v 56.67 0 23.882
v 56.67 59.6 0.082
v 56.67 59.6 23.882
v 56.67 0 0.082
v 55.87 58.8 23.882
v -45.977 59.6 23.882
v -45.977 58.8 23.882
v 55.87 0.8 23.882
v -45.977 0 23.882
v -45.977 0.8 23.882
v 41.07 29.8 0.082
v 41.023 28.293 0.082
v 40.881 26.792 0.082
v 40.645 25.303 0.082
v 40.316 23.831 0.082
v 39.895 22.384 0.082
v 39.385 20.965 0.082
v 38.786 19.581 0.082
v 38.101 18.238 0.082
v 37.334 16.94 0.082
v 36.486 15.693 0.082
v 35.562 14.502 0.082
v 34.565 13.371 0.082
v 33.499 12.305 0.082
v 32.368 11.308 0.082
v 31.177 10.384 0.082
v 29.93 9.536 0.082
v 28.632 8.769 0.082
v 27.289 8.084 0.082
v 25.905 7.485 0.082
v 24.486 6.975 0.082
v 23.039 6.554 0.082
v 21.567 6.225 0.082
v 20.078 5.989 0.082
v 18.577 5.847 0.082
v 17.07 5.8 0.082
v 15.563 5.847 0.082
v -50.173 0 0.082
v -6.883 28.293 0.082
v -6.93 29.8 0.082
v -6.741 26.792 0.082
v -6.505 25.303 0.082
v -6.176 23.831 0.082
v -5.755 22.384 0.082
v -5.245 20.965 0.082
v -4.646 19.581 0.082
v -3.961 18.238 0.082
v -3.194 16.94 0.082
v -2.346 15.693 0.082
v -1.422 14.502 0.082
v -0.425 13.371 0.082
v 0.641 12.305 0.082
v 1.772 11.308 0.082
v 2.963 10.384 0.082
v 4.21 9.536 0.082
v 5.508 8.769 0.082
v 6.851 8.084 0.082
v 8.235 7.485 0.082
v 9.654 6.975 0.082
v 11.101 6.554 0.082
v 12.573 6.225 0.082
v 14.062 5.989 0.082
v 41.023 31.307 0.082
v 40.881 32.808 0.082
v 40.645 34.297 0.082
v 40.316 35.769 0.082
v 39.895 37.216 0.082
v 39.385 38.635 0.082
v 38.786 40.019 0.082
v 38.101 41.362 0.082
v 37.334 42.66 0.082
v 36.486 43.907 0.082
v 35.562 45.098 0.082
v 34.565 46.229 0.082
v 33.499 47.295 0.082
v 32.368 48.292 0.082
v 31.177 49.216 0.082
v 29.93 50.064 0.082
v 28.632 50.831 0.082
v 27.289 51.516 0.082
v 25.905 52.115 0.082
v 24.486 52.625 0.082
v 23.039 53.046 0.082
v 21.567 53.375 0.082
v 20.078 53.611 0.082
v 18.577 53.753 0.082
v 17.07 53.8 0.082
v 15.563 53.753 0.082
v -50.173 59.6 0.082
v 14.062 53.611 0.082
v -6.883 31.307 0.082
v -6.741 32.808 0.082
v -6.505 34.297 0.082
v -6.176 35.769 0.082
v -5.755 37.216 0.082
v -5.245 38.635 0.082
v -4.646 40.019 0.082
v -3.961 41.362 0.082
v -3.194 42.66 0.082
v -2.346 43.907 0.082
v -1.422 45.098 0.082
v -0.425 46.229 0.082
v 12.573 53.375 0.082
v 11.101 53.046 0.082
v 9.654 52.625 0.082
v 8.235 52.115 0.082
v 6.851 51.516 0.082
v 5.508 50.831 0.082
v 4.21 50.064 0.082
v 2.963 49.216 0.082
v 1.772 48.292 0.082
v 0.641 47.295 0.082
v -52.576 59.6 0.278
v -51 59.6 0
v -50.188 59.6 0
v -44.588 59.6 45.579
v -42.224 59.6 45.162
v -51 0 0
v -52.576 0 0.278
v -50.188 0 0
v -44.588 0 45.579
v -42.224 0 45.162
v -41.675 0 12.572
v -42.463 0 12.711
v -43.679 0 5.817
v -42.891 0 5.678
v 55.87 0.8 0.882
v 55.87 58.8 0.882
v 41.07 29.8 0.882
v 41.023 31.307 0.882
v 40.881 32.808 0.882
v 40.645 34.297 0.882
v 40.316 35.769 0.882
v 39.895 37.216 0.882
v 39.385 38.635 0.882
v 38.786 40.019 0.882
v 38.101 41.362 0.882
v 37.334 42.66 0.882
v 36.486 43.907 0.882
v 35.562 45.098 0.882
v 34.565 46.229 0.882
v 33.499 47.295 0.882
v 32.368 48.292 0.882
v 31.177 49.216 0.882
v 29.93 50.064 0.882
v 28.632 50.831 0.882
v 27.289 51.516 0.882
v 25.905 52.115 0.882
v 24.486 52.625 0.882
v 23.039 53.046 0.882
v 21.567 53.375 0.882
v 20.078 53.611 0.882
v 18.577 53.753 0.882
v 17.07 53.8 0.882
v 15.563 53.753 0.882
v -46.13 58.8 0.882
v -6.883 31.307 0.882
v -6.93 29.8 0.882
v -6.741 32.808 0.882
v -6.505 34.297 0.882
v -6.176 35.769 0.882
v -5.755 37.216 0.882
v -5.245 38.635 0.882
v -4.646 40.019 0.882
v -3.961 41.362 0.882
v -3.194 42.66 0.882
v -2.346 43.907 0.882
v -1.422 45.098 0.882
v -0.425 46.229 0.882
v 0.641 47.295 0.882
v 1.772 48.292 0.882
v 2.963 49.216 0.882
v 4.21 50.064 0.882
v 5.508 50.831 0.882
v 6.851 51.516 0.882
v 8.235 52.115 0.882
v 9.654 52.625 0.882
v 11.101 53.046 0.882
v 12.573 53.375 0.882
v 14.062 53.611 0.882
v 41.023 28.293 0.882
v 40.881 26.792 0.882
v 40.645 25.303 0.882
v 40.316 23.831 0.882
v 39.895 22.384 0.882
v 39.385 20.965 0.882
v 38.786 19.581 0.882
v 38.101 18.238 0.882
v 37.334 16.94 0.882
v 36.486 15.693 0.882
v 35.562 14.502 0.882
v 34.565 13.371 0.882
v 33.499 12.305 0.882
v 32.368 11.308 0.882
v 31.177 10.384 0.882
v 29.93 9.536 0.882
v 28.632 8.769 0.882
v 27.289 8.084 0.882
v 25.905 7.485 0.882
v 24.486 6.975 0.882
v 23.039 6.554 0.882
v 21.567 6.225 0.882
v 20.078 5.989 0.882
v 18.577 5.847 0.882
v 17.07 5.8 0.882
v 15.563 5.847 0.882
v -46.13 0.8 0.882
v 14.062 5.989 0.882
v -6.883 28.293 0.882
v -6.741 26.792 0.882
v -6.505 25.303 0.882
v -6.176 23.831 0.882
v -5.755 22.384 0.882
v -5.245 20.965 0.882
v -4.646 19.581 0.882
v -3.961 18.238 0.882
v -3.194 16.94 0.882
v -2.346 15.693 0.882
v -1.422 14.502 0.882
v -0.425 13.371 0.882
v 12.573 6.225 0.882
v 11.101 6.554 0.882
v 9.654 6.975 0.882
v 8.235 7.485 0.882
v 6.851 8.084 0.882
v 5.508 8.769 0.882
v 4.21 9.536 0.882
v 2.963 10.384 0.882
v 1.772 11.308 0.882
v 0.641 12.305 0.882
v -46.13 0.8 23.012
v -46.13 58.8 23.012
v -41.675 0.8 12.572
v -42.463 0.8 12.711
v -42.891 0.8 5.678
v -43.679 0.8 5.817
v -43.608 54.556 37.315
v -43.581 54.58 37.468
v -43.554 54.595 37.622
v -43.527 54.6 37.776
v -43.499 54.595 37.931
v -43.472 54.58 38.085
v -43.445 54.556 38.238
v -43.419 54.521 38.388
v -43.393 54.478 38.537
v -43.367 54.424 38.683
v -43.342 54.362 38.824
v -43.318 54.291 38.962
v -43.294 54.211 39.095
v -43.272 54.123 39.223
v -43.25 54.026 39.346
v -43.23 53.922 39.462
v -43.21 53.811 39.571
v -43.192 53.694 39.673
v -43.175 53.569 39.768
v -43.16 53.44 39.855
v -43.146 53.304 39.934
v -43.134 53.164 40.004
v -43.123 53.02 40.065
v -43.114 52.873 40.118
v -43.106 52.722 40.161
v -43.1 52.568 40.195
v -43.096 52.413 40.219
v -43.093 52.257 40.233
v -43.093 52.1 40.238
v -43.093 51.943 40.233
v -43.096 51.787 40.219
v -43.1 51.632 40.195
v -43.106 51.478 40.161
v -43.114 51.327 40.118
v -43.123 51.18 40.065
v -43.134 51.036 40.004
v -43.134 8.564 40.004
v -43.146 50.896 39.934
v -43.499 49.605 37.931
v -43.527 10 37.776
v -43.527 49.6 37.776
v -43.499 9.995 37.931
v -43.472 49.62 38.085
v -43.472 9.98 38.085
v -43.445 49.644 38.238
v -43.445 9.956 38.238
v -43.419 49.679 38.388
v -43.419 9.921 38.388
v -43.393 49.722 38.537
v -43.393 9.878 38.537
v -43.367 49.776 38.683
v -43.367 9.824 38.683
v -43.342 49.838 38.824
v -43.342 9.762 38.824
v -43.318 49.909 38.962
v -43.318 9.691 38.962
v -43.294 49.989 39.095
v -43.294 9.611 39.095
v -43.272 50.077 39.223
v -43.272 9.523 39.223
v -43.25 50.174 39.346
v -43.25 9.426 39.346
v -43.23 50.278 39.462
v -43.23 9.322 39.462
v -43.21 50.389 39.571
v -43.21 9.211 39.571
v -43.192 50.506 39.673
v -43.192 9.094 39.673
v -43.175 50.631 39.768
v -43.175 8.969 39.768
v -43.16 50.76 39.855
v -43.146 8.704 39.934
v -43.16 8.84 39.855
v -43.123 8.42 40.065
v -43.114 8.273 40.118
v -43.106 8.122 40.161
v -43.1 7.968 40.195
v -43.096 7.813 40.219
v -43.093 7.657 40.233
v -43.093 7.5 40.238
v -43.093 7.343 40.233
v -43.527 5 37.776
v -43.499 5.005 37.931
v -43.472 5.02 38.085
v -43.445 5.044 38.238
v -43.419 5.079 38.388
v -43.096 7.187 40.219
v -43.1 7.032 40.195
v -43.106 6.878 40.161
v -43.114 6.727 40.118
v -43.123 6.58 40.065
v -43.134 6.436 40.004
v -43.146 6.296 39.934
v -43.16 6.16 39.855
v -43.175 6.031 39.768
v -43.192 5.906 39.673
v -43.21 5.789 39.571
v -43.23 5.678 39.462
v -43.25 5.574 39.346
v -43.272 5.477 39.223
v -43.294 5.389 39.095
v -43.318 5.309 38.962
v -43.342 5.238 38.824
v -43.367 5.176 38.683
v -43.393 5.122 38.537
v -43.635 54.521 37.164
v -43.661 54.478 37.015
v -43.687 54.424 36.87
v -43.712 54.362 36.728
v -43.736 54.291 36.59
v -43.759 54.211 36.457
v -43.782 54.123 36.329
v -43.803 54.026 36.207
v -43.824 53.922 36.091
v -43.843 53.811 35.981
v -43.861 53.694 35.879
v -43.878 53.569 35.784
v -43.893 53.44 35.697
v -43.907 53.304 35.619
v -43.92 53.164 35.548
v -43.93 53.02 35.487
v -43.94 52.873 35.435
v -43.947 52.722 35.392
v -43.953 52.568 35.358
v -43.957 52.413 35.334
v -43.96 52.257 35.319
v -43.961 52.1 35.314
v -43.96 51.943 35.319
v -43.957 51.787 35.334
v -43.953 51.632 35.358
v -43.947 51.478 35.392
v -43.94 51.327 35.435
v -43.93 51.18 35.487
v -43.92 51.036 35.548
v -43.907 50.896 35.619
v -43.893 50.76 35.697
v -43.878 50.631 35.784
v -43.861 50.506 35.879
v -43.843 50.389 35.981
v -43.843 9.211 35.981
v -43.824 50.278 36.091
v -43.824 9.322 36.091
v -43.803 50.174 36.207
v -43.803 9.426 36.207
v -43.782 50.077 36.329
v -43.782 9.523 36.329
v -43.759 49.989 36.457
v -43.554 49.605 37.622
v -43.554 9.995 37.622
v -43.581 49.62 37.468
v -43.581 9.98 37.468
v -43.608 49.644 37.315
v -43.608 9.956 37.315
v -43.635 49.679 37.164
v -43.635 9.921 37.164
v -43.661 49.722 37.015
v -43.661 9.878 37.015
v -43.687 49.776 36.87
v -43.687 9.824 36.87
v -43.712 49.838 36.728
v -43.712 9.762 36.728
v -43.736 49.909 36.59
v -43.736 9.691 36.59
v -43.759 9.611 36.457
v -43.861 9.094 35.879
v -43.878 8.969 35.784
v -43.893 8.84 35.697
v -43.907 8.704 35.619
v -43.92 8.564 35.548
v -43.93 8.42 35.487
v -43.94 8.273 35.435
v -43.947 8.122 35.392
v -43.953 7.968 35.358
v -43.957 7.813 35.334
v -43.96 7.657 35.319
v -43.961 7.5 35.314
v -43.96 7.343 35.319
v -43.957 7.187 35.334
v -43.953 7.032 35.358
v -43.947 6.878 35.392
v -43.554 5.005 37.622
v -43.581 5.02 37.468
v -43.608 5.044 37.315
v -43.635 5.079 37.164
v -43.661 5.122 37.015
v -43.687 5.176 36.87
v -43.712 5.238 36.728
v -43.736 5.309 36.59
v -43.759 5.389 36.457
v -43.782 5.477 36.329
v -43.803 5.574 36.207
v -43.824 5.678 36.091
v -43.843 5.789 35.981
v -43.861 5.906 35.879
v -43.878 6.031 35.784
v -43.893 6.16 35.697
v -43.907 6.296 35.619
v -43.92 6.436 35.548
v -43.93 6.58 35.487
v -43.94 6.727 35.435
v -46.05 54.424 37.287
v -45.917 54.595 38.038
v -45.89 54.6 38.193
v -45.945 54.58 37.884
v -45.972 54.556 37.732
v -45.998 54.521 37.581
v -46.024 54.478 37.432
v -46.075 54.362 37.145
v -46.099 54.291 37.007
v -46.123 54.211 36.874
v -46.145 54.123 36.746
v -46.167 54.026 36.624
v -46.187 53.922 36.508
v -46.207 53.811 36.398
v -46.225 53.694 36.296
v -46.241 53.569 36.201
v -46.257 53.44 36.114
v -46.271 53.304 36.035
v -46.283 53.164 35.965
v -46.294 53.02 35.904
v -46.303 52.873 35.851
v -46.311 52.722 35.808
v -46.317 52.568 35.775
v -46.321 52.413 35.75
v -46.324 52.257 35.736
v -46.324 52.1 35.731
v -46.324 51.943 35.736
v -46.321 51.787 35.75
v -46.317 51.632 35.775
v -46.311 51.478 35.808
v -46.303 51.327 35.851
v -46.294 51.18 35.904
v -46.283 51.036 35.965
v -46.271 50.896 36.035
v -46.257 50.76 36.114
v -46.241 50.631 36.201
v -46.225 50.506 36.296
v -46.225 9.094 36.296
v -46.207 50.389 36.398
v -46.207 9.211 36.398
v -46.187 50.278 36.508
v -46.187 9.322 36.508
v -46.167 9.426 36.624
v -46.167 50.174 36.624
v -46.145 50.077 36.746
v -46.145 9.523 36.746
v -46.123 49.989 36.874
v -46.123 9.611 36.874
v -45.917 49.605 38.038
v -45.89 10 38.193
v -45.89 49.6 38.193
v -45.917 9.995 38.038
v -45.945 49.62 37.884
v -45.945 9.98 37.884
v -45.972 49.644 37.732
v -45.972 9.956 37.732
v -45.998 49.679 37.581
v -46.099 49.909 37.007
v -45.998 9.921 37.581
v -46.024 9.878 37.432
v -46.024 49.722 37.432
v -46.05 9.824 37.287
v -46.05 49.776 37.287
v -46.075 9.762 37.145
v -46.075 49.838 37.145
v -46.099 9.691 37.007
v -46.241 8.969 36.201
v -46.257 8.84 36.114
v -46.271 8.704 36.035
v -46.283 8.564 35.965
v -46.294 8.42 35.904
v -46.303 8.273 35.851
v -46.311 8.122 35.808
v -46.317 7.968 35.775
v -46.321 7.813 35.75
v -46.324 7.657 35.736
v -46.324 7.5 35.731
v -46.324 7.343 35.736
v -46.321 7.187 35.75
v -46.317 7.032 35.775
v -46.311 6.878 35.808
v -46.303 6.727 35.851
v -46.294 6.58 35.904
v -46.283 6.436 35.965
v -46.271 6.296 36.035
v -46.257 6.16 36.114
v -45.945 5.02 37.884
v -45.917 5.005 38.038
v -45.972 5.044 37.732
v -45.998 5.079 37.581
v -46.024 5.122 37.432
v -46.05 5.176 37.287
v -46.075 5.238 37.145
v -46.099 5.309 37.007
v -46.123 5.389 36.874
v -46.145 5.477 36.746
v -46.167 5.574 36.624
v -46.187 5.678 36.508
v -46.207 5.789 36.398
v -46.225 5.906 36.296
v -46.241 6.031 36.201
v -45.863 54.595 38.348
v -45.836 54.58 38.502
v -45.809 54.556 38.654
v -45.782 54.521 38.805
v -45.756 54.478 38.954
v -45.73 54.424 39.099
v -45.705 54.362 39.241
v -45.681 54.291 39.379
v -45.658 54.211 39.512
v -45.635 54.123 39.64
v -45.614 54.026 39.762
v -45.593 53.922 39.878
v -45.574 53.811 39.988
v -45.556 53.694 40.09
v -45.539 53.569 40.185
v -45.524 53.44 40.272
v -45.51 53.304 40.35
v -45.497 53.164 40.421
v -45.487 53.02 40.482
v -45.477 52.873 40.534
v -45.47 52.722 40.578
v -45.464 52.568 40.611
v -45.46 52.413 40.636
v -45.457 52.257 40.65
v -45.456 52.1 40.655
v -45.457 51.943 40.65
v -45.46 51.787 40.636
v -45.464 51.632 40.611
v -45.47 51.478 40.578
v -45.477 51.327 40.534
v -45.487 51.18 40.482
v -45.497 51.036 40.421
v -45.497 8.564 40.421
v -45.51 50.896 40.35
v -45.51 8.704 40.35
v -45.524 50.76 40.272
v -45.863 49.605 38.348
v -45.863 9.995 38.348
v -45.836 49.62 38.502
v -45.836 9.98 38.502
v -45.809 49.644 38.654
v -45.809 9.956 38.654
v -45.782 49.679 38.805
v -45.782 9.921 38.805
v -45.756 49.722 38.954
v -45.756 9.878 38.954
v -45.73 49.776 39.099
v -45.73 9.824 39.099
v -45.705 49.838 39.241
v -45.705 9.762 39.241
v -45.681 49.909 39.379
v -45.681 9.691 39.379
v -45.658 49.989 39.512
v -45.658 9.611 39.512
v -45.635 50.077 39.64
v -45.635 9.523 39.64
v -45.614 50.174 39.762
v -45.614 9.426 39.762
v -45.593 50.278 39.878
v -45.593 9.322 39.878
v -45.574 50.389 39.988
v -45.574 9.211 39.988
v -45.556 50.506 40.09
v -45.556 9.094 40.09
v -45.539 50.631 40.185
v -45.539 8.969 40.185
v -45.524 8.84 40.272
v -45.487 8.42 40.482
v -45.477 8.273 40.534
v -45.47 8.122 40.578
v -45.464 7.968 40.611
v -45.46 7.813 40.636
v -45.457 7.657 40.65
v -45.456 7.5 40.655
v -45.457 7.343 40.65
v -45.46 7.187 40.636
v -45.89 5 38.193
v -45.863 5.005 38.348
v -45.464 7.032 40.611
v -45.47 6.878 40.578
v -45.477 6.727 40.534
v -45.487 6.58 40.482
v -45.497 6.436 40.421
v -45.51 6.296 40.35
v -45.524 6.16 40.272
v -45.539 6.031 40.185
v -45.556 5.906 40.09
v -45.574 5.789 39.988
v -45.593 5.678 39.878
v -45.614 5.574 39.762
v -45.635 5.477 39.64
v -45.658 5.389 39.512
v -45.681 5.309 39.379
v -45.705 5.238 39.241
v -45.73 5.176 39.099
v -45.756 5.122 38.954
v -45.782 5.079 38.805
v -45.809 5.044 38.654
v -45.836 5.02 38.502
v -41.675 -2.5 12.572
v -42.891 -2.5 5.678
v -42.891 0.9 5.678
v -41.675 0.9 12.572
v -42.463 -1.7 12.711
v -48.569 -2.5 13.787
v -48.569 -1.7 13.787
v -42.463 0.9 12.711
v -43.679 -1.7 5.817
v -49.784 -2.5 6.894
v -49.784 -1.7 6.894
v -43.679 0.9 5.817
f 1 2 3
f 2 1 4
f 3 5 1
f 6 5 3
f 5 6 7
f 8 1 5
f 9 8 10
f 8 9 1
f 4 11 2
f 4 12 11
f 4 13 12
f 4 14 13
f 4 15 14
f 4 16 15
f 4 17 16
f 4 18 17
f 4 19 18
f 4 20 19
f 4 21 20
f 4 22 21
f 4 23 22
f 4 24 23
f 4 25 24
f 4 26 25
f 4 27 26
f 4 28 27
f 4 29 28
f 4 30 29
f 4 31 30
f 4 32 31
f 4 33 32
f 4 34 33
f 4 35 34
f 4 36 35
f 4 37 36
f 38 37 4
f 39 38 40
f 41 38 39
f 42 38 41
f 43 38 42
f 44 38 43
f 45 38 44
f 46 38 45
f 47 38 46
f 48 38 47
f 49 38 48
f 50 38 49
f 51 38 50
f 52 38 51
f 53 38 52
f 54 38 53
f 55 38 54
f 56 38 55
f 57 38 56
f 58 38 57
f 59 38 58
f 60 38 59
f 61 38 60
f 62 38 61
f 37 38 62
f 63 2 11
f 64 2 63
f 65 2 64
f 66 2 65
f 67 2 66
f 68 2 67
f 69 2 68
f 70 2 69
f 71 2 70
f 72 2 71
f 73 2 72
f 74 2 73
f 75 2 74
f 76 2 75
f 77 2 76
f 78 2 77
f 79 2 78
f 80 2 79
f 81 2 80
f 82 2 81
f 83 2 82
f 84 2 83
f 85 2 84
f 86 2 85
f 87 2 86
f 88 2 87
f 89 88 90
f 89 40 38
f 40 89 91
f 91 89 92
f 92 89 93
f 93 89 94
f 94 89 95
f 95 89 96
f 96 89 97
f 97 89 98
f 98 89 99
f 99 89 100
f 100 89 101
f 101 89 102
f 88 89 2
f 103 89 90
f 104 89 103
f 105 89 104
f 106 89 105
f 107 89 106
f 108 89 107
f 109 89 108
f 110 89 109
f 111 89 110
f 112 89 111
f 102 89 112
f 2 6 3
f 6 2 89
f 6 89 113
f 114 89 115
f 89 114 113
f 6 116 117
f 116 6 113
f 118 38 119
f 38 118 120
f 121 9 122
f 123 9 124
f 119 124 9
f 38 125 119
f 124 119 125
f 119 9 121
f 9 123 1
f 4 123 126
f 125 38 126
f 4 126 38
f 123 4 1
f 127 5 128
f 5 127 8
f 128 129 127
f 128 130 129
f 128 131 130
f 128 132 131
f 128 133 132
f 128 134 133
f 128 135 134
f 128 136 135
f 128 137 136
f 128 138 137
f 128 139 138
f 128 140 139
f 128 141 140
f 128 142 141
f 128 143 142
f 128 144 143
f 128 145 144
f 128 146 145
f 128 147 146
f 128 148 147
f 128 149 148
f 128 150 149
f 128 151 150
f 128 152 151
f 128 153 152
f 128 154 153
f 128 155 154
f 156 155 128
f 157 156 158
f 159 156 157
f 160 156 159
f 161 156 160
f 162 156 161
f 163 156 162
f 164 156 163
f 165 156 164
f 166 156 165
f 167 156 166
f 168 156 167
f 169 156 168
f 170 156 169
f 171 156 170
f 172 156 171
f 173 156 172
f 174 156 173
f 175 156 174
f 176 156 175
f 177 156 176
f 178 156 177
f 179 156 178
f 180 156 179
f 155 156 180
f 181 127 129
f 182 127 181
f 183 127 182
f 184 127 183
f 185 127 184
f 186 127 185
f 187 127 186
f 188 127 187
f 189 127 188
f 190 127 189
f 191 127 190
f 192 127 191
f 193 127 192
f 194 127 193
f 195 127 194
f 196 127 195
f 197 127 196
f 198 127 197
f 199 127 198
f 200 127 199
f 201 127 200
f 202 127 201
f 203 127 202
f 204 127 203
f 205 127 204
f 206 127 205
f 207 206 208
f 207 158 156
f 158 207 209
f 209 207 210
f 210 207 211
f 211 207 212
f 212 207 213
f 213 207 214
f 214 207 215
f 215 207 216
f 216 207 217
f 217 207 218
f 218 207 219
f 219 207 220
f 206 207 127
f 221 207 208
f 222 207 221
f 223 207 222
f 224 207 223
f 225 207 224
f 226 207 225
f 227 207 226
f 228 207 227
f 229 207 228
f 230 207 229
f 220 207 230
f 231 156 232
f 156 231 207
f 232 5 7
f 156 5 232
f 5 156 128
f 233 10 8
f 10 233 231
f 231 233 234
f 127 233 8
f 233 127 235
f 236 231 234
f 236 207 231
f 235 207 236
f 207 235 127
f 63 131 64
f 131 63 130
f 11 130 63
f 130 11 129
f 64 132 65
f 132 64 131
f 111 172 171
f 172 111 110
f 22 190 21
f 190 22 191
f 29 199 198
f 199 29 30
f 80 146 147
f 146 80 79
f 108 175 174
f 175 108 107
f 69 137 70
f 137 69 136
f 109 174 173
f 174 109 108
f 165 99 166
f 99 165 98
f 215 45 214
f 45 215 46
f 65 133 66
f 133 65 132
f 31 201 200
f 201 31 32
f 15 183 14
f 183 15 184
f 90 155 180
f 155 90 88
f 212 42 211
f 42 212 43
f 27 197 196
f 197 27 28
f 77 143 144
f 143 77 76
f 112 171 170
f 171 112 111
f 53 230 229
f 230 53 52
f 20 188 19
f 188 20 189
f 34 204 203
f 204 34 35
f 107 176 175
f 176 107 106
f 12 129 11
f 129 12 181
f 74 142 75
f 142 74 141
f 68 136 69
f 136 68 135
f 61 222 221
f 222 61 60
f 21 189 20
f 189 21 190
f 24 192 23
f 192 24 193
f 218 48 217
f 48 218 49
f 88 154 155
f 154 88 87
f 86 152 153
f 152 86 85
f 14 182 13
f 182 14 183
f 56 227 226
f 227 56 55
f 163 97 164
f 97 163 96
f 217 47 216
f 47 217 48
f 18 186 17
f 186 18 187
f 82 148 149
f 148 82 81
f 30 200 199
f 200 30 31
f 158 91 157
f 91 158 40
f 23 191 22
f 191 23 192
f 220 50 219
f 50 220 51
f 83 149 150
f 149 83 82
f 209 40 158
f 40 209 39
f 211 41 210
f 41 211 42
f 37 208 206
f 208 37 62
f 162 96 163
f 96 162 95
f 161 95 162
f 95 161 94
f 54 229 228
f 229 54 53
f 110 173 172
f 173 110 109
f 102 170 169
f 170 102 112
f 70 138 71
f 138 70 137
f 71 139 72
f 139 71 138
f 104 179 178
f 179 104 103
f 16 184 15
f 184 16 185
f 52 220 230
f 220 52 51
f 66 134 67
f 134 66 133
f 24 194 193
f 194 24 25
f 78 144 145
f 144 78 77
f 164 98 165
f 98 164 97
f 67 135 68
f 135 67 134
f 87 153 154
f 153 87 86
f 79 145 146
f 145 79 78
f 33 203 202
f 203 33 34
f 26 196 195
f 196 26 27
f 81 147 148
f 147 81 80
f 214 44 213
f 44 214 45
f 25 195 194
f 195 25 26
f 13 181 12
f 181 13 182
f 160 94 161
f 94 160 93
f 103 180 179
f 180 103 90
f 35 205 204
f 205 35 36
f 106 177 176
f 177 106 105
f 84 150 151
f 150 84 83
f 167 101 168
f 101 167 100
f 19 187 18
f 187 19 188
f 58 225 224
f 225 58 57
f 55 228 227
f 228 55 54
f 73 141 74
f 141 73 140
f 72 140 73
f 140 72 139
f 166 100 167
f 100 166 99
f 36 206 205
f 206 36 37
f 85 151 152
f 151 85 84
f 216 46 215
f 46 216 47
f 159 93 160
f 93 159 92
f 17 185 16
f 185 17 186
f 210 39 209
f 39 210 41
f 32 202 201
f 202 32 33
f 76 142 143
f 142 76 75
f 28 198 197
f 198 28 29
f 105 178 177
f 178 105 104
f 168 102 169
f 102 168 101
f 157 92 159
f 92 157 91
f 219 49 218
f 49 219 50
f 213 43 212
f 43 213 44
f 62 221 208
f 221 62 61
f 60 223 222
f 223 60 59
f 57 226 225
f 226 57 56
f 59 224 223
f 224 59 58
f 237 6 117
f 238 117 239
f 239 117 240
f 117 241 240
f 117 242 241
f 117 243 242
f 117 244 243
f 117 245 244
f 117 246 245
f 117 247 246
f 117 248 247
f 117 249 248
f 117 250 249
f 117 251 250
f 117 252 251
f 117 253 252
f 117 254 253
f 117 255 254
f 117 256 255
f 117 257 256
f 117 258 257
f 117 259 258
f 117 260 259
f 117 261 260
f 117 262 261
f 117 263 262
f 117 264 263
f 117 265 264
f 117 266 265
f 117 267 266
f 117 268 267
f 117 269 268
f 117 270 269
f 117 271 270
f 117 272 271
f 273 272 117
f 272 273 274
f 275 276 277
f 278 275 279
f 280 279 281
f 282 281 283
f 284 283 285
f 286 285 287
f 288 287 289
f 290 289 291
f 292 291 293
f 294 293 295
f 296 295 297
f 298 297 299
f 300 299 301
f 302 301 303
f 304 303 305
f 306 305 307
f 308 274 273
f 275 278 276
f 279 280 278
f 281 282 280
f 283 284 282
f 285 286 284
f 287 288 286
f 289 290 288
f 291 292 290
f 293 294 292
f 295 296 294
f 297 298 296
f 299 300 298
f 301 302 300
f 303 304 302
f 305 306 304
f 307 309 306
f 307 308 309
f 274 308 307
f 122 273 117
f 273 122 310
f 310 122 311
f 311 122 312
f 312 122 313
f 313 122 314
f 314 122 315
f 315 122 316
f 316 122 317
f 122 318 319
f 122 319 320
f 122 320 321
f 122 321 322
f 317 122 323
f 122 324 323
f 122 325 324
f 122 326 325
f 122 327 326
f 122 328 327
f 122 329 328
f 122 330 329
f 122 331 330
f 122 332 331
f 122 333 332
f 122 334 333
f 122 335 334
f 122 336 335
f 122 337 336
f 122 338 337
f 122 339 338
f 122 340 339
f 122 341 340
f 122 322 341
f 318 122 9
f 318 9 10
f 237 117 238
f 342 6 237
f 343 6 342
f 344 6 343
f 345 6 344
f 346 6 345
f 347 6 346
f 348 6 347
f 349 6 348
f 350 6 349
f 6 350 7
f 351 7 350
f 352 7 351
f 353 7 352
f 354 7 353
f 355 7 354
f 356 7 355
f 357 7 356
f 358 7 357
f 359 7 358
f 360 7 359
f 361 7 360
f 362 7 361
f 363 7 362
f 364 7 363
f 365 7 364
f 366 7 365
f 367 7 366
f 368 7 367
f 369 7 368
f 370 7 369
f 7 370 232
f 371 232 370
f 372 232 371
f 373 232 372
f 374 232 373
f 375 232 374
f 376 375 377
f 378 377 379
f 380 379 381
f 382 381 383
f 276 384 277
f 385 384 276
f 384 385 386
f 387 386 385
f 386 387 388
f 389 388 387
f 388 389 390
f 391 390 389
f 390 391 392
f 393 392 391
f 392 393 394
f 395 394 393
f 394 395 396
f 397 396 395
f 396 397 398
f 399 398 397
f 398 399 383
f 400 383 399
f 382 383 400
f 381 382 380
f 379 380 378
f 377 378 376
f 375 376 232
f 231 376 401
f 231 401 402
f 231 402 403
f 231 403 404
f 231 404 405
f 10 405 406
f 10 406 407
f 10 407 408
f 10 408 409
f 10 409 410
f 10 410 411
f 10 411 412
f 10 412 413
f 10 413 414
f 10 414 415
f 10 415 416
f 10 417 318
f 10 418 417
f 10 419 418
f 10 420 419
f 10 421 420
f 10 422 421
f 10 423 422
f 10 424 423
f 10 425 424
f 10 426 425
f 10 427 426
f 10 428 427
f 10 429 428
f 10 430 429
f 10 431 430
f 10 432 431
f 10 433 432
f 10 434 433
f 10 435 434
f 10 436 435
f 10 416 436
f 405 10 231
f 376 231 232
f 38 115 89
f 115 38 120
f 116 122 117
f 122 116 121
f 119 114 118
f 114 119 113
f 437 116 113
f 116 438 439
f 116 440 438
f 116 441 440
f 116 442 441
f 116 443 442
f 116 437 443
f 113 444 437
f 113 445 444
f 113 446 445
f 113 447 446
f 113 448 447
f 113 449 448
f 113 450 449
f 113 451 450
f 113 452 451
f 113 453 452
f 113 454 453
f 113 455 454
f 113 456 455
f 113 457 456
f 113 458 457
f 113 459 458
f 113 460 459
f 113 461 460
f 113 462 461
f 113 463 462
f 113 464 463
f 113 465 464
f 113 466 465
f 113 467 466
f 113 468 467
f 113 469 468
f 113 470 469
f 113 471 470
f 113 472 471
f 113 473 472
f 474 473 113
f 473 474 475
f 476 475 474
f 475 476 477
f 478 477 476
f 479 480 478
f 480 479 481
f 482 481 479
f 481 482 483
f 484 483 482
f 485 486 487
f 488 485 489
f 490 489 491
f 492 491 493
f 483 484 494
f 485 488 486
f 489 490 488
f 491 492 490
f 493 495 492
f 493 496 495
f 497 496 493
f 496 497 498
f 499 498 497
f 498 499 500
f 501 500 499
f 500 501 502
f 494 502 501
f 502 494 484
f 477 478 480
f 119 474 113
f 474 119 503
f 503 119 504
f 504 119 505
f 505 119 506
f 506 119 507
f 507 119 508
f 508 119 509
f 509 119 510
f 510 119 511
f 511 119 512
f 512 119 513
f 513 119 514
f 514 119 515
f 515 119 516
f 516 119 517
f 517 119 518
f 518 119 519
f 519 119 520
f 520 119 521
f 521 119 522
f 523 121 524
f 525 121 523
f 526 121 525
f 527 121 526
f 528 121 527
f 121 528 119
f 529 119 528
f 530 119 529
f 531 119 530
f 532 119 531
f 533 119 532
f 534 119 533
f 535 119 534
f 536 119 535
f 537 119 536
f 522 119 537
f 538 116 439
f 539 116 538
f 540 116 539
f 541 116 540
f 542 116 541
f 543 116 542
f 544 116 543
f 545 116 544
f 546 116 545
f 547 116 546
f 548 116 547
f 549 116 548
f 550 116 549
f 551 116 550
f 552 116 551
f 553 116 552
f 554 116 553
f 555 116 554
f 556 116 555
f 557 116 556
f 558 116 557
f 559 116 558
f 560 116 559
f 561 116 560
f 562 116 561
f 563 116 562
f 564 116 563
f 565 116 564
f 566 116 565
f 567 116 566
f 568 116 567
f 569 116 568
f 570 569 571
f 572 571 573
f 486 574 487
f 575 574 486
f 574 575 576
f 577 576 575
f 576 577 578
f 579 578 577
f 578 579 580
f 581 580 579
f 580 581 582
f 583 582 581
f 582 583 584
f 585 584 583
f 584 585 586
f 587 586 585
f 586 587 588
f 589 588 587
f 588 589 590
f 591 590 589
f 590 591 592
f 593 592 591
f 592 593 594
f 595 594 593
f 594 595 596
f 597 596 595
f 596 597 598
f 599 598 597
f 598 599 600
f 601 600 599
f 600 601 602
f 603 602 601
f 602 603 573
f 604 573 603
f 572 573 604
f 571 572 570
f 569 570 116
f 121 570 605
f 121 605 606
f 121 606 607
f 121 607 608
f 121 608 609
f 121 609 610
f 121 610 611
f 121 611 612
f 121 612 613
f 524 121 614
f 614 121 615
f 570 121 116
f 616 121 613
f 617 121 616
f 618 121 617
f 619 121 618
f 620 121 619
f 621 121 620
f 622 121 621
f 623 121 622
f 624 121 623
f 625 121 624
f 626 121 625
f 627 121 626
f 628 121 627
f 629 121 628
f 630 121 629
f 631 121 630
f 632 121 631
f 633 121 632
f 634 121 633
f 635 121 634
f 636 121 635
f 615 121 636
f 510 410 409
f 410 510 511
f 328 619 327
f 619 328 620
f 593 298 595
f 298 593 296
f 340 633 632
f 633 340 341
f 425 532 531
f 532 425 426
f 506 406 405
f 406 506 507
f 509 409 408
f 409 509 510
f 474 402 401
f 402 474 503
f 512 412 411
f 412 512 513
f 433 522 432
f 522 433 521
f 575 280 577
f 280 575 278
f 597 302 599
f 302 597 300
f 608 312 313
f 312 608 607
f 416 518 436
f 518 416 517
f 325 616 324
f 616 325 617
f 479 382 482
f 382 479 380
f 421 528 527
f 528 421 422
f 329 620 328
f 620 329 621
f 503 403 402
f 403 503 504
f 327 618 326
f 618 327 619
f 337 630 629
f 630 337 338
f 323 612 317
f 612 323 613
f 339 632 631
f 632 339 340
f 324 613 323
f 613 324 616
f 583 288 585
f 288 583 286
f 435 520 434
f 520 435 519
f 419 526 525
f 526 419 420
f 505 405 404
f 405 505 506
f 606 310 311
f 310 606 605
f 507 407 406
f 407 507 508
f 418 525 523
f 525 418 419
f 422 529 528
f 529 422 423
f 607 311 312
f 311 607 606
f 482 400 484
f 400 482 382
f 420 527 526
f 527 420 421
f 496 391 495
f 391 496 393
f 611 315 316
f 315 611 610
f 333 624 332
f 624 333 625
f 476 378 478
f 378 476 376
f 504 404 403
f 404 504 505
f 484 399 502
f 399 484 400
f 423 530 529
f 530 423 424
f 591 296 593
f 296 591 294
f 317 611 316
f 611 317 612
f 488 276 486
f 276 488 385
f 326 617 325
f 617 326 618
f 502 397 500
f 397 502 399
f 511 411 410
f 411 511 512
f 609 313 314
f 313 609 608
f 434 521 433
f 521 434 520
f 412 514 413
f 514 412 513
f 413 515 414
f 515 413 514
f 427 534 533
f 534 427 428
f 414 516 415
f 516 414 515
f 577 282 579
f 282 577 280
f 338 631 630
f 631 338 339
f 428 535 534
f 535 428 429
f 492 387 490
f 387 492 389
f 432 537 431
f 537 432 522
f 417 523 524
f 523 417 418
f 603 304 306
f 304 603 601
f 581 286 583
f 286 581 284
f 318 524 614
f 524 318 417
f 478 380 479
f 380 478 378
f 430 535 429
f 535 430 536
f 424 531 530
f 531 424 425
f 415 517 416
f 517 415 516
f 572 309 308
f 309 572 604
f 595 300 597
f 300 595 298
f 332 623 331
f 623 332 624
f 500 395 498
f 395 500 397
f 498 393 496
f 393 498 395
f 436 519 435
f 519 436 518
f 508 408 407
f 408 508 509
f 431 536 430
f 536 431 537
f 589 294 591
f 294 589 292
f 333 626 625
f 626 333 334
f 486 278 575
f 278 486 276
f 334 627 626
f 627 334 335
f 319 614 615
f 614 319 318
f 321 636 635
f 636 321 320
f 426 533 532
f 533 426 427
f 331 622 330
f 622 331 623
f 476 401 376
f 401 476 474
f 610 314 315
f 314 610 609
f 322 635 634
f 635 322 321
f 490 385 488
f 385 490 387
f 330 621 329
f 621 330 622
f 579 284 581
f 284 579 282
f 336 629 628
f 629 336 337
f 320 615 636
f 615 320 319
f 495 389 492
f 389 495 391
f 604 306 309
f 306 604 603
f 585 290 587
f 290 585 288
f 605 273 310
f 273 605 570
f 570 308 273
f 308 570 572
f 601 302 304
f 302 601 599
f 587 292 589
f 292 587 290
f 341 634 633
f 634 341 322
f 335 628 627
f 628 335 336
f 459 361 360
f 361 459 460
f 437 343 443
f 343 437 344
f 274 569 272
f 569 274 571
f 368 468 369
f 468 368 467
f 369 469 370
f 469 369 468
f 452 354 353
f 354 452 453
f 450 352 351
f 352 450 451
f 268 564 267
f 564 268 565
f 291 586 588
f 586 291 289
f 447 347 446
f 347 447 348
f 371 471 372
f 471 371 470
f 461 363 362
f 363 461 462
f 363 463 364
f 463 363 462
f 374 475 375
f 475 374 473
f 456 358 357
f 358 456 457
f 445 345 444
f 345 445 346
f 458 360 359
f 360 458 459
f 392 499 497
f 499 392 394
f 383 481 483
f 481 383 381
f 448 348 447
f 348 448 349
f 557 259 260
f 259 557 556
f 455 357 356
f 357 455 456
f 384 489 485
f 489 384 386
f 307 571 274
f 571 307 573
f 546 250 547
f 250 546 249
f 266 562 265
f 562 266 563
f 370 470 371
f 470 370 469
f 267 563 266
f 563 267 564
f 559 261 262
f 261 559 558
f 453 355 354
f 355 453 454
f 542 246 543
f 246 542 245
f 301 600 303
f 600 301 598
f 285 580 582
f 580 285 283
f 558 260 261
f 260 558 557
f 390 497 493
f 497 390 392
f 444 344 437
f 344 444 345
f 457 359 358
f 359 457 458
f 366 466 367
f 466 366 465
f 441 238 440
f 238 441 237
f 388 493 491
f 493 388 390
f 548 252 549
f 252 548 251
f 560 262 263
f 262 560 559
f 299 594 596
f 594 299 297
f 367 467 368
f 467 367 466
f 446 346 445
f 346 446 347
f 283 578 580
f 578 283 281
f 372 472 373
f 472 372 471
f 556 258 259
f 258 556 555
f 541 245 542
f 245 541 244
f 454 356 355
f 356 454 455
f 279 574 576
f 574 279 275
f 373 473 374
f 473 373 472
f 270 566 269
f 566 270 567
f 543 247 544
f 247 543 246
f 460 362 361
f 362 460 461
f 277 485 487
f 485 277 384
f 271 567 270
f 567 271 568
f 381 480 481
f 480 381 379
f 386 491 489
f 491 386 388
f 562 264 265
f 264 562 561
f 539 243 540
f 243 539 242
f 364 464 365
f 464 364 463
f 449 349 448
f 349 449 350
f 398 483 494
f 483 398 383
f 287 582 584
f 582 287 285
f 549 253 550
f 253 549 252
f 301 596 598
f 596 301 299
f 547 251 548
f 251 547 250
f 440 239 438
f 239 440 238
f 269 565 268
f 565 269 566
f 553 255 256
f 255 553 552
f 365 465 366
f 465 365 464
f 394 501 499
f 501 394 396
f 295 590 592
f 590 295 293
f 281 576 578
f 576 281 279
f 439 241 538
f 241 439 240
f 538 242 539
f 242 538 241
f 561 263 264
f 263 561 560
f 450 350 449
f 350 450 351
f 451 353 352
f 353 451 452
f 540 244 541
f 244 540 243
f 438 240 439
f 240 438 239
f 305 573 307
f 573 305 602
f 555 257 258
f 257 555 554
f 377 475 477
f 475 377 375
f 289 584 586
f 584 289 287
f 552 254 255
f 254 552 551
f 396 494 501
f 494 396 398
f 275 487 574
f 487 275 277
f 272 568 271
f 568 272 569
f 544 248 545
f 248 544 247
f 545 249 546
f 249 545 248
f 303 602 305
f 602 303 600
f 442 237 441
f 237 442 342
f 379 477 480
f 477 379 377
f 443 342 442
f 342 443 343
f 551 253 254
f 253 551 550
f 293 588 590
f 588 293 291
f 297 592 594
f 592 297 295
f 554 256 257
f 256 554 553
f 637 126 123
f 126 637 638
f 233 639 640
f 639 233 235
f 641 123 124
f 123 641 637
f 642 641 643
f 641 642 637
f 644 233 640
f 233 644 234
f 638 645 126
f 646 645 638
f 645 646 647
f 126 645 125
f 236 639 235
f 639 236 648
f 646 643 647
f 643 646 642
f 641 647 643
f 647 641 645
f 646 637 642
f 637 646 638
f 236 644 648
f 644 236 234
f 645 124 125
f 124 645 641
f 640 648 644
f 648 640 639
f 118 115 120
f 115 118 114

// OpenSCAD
$fn = 100;

camera_l = 102;
camera_w = 58;
camera_h = 23;
camera_a = 10;

wall_t = 0.8;

lense_d = 48;
lense_r = lense_d / 2;
lense_top_off = 14;

cable_t = 1.7;
clip_w = 7;
screw_d = 5;
screw_r = screw_d / 2;

mount_t = 1.6;
mount_h = camera_h * 2;

module cradle_box() {
    difference() {
        cube([camera_l + wall_t * 2, camera_w + wall_t * 2, camera_h + wall_t]);
        translate([wall_t, wall_t, wall_t])
        cube([camera_l, camera_w, camera_h + 1]);
    }
}

module lense_cutout() {
    translate([0, 0, -wall_t])
    cylinder(r=lense_r, h = wall_t * 3);
}
    
module cradle_w_lense() {
    difference() {
        cradle_box();
        translate([camera_l - lense_top_off - lense_r, camera_w / 2 + wall_t, 0])
        lense_cutout();
    }
}

module cradle() {
    shift = (camera_h + wall_t) * sin(camera_a);
    difference() {
    translate([shift, 0, 0])
    rotate([0, -camera_a, 0])
    translate([0, 0, wall_t])
    union() {
        translate([-shift, 0,  0])
        cube([shift, camera_w + wall_t * 2, camera_h + wall_t]);
        cradle_w_lense();
    }
    
    translate([-shift * 2, -1, 1])
    cube([shift * 2, camera_w * 2, camera_h * 2]);
}
}

module mount() {
    difference() {
        cube([mount_t + wall_t, camera_w + wall_t * 2, mount_h]);
        translate([-mount_t + 1, screw_d * 1.5, mount_h - screw_d * 1.5])
        rotate([0, 90, 0])
        cylinder(r=screw_r, h=mount_t + 2);
        translate([-mount_t + 1, camera_w + wall_t * 2 - screw_d * 1.5, mount_h - screw_d * 1.5])
        rotate([0, 90, 0])
        cylinder(r=screw_r, h=mount_t + 2);
    }
}

module clip() {
    translate([0, -wall_t - cable_t, 0])
    cube([clip_w, wall_t, clip_w]);
    translate([clip_w - wall_t, -wall_t * 3, 0])
    cube([wall_t, wall_t * 2 + cable_t, clip_w]);
}
translate([-camera_l / 2, 0, 0])
difference() {
rotate([0, camera_a, 0]) {
cradle();
translate([-mount_t, 0, 0])
mount();
translate([0, 0, clip_w])
clip();
}
translate([-1000, -1000, -1000])
cube([2000, 2000, 1000]);
}
